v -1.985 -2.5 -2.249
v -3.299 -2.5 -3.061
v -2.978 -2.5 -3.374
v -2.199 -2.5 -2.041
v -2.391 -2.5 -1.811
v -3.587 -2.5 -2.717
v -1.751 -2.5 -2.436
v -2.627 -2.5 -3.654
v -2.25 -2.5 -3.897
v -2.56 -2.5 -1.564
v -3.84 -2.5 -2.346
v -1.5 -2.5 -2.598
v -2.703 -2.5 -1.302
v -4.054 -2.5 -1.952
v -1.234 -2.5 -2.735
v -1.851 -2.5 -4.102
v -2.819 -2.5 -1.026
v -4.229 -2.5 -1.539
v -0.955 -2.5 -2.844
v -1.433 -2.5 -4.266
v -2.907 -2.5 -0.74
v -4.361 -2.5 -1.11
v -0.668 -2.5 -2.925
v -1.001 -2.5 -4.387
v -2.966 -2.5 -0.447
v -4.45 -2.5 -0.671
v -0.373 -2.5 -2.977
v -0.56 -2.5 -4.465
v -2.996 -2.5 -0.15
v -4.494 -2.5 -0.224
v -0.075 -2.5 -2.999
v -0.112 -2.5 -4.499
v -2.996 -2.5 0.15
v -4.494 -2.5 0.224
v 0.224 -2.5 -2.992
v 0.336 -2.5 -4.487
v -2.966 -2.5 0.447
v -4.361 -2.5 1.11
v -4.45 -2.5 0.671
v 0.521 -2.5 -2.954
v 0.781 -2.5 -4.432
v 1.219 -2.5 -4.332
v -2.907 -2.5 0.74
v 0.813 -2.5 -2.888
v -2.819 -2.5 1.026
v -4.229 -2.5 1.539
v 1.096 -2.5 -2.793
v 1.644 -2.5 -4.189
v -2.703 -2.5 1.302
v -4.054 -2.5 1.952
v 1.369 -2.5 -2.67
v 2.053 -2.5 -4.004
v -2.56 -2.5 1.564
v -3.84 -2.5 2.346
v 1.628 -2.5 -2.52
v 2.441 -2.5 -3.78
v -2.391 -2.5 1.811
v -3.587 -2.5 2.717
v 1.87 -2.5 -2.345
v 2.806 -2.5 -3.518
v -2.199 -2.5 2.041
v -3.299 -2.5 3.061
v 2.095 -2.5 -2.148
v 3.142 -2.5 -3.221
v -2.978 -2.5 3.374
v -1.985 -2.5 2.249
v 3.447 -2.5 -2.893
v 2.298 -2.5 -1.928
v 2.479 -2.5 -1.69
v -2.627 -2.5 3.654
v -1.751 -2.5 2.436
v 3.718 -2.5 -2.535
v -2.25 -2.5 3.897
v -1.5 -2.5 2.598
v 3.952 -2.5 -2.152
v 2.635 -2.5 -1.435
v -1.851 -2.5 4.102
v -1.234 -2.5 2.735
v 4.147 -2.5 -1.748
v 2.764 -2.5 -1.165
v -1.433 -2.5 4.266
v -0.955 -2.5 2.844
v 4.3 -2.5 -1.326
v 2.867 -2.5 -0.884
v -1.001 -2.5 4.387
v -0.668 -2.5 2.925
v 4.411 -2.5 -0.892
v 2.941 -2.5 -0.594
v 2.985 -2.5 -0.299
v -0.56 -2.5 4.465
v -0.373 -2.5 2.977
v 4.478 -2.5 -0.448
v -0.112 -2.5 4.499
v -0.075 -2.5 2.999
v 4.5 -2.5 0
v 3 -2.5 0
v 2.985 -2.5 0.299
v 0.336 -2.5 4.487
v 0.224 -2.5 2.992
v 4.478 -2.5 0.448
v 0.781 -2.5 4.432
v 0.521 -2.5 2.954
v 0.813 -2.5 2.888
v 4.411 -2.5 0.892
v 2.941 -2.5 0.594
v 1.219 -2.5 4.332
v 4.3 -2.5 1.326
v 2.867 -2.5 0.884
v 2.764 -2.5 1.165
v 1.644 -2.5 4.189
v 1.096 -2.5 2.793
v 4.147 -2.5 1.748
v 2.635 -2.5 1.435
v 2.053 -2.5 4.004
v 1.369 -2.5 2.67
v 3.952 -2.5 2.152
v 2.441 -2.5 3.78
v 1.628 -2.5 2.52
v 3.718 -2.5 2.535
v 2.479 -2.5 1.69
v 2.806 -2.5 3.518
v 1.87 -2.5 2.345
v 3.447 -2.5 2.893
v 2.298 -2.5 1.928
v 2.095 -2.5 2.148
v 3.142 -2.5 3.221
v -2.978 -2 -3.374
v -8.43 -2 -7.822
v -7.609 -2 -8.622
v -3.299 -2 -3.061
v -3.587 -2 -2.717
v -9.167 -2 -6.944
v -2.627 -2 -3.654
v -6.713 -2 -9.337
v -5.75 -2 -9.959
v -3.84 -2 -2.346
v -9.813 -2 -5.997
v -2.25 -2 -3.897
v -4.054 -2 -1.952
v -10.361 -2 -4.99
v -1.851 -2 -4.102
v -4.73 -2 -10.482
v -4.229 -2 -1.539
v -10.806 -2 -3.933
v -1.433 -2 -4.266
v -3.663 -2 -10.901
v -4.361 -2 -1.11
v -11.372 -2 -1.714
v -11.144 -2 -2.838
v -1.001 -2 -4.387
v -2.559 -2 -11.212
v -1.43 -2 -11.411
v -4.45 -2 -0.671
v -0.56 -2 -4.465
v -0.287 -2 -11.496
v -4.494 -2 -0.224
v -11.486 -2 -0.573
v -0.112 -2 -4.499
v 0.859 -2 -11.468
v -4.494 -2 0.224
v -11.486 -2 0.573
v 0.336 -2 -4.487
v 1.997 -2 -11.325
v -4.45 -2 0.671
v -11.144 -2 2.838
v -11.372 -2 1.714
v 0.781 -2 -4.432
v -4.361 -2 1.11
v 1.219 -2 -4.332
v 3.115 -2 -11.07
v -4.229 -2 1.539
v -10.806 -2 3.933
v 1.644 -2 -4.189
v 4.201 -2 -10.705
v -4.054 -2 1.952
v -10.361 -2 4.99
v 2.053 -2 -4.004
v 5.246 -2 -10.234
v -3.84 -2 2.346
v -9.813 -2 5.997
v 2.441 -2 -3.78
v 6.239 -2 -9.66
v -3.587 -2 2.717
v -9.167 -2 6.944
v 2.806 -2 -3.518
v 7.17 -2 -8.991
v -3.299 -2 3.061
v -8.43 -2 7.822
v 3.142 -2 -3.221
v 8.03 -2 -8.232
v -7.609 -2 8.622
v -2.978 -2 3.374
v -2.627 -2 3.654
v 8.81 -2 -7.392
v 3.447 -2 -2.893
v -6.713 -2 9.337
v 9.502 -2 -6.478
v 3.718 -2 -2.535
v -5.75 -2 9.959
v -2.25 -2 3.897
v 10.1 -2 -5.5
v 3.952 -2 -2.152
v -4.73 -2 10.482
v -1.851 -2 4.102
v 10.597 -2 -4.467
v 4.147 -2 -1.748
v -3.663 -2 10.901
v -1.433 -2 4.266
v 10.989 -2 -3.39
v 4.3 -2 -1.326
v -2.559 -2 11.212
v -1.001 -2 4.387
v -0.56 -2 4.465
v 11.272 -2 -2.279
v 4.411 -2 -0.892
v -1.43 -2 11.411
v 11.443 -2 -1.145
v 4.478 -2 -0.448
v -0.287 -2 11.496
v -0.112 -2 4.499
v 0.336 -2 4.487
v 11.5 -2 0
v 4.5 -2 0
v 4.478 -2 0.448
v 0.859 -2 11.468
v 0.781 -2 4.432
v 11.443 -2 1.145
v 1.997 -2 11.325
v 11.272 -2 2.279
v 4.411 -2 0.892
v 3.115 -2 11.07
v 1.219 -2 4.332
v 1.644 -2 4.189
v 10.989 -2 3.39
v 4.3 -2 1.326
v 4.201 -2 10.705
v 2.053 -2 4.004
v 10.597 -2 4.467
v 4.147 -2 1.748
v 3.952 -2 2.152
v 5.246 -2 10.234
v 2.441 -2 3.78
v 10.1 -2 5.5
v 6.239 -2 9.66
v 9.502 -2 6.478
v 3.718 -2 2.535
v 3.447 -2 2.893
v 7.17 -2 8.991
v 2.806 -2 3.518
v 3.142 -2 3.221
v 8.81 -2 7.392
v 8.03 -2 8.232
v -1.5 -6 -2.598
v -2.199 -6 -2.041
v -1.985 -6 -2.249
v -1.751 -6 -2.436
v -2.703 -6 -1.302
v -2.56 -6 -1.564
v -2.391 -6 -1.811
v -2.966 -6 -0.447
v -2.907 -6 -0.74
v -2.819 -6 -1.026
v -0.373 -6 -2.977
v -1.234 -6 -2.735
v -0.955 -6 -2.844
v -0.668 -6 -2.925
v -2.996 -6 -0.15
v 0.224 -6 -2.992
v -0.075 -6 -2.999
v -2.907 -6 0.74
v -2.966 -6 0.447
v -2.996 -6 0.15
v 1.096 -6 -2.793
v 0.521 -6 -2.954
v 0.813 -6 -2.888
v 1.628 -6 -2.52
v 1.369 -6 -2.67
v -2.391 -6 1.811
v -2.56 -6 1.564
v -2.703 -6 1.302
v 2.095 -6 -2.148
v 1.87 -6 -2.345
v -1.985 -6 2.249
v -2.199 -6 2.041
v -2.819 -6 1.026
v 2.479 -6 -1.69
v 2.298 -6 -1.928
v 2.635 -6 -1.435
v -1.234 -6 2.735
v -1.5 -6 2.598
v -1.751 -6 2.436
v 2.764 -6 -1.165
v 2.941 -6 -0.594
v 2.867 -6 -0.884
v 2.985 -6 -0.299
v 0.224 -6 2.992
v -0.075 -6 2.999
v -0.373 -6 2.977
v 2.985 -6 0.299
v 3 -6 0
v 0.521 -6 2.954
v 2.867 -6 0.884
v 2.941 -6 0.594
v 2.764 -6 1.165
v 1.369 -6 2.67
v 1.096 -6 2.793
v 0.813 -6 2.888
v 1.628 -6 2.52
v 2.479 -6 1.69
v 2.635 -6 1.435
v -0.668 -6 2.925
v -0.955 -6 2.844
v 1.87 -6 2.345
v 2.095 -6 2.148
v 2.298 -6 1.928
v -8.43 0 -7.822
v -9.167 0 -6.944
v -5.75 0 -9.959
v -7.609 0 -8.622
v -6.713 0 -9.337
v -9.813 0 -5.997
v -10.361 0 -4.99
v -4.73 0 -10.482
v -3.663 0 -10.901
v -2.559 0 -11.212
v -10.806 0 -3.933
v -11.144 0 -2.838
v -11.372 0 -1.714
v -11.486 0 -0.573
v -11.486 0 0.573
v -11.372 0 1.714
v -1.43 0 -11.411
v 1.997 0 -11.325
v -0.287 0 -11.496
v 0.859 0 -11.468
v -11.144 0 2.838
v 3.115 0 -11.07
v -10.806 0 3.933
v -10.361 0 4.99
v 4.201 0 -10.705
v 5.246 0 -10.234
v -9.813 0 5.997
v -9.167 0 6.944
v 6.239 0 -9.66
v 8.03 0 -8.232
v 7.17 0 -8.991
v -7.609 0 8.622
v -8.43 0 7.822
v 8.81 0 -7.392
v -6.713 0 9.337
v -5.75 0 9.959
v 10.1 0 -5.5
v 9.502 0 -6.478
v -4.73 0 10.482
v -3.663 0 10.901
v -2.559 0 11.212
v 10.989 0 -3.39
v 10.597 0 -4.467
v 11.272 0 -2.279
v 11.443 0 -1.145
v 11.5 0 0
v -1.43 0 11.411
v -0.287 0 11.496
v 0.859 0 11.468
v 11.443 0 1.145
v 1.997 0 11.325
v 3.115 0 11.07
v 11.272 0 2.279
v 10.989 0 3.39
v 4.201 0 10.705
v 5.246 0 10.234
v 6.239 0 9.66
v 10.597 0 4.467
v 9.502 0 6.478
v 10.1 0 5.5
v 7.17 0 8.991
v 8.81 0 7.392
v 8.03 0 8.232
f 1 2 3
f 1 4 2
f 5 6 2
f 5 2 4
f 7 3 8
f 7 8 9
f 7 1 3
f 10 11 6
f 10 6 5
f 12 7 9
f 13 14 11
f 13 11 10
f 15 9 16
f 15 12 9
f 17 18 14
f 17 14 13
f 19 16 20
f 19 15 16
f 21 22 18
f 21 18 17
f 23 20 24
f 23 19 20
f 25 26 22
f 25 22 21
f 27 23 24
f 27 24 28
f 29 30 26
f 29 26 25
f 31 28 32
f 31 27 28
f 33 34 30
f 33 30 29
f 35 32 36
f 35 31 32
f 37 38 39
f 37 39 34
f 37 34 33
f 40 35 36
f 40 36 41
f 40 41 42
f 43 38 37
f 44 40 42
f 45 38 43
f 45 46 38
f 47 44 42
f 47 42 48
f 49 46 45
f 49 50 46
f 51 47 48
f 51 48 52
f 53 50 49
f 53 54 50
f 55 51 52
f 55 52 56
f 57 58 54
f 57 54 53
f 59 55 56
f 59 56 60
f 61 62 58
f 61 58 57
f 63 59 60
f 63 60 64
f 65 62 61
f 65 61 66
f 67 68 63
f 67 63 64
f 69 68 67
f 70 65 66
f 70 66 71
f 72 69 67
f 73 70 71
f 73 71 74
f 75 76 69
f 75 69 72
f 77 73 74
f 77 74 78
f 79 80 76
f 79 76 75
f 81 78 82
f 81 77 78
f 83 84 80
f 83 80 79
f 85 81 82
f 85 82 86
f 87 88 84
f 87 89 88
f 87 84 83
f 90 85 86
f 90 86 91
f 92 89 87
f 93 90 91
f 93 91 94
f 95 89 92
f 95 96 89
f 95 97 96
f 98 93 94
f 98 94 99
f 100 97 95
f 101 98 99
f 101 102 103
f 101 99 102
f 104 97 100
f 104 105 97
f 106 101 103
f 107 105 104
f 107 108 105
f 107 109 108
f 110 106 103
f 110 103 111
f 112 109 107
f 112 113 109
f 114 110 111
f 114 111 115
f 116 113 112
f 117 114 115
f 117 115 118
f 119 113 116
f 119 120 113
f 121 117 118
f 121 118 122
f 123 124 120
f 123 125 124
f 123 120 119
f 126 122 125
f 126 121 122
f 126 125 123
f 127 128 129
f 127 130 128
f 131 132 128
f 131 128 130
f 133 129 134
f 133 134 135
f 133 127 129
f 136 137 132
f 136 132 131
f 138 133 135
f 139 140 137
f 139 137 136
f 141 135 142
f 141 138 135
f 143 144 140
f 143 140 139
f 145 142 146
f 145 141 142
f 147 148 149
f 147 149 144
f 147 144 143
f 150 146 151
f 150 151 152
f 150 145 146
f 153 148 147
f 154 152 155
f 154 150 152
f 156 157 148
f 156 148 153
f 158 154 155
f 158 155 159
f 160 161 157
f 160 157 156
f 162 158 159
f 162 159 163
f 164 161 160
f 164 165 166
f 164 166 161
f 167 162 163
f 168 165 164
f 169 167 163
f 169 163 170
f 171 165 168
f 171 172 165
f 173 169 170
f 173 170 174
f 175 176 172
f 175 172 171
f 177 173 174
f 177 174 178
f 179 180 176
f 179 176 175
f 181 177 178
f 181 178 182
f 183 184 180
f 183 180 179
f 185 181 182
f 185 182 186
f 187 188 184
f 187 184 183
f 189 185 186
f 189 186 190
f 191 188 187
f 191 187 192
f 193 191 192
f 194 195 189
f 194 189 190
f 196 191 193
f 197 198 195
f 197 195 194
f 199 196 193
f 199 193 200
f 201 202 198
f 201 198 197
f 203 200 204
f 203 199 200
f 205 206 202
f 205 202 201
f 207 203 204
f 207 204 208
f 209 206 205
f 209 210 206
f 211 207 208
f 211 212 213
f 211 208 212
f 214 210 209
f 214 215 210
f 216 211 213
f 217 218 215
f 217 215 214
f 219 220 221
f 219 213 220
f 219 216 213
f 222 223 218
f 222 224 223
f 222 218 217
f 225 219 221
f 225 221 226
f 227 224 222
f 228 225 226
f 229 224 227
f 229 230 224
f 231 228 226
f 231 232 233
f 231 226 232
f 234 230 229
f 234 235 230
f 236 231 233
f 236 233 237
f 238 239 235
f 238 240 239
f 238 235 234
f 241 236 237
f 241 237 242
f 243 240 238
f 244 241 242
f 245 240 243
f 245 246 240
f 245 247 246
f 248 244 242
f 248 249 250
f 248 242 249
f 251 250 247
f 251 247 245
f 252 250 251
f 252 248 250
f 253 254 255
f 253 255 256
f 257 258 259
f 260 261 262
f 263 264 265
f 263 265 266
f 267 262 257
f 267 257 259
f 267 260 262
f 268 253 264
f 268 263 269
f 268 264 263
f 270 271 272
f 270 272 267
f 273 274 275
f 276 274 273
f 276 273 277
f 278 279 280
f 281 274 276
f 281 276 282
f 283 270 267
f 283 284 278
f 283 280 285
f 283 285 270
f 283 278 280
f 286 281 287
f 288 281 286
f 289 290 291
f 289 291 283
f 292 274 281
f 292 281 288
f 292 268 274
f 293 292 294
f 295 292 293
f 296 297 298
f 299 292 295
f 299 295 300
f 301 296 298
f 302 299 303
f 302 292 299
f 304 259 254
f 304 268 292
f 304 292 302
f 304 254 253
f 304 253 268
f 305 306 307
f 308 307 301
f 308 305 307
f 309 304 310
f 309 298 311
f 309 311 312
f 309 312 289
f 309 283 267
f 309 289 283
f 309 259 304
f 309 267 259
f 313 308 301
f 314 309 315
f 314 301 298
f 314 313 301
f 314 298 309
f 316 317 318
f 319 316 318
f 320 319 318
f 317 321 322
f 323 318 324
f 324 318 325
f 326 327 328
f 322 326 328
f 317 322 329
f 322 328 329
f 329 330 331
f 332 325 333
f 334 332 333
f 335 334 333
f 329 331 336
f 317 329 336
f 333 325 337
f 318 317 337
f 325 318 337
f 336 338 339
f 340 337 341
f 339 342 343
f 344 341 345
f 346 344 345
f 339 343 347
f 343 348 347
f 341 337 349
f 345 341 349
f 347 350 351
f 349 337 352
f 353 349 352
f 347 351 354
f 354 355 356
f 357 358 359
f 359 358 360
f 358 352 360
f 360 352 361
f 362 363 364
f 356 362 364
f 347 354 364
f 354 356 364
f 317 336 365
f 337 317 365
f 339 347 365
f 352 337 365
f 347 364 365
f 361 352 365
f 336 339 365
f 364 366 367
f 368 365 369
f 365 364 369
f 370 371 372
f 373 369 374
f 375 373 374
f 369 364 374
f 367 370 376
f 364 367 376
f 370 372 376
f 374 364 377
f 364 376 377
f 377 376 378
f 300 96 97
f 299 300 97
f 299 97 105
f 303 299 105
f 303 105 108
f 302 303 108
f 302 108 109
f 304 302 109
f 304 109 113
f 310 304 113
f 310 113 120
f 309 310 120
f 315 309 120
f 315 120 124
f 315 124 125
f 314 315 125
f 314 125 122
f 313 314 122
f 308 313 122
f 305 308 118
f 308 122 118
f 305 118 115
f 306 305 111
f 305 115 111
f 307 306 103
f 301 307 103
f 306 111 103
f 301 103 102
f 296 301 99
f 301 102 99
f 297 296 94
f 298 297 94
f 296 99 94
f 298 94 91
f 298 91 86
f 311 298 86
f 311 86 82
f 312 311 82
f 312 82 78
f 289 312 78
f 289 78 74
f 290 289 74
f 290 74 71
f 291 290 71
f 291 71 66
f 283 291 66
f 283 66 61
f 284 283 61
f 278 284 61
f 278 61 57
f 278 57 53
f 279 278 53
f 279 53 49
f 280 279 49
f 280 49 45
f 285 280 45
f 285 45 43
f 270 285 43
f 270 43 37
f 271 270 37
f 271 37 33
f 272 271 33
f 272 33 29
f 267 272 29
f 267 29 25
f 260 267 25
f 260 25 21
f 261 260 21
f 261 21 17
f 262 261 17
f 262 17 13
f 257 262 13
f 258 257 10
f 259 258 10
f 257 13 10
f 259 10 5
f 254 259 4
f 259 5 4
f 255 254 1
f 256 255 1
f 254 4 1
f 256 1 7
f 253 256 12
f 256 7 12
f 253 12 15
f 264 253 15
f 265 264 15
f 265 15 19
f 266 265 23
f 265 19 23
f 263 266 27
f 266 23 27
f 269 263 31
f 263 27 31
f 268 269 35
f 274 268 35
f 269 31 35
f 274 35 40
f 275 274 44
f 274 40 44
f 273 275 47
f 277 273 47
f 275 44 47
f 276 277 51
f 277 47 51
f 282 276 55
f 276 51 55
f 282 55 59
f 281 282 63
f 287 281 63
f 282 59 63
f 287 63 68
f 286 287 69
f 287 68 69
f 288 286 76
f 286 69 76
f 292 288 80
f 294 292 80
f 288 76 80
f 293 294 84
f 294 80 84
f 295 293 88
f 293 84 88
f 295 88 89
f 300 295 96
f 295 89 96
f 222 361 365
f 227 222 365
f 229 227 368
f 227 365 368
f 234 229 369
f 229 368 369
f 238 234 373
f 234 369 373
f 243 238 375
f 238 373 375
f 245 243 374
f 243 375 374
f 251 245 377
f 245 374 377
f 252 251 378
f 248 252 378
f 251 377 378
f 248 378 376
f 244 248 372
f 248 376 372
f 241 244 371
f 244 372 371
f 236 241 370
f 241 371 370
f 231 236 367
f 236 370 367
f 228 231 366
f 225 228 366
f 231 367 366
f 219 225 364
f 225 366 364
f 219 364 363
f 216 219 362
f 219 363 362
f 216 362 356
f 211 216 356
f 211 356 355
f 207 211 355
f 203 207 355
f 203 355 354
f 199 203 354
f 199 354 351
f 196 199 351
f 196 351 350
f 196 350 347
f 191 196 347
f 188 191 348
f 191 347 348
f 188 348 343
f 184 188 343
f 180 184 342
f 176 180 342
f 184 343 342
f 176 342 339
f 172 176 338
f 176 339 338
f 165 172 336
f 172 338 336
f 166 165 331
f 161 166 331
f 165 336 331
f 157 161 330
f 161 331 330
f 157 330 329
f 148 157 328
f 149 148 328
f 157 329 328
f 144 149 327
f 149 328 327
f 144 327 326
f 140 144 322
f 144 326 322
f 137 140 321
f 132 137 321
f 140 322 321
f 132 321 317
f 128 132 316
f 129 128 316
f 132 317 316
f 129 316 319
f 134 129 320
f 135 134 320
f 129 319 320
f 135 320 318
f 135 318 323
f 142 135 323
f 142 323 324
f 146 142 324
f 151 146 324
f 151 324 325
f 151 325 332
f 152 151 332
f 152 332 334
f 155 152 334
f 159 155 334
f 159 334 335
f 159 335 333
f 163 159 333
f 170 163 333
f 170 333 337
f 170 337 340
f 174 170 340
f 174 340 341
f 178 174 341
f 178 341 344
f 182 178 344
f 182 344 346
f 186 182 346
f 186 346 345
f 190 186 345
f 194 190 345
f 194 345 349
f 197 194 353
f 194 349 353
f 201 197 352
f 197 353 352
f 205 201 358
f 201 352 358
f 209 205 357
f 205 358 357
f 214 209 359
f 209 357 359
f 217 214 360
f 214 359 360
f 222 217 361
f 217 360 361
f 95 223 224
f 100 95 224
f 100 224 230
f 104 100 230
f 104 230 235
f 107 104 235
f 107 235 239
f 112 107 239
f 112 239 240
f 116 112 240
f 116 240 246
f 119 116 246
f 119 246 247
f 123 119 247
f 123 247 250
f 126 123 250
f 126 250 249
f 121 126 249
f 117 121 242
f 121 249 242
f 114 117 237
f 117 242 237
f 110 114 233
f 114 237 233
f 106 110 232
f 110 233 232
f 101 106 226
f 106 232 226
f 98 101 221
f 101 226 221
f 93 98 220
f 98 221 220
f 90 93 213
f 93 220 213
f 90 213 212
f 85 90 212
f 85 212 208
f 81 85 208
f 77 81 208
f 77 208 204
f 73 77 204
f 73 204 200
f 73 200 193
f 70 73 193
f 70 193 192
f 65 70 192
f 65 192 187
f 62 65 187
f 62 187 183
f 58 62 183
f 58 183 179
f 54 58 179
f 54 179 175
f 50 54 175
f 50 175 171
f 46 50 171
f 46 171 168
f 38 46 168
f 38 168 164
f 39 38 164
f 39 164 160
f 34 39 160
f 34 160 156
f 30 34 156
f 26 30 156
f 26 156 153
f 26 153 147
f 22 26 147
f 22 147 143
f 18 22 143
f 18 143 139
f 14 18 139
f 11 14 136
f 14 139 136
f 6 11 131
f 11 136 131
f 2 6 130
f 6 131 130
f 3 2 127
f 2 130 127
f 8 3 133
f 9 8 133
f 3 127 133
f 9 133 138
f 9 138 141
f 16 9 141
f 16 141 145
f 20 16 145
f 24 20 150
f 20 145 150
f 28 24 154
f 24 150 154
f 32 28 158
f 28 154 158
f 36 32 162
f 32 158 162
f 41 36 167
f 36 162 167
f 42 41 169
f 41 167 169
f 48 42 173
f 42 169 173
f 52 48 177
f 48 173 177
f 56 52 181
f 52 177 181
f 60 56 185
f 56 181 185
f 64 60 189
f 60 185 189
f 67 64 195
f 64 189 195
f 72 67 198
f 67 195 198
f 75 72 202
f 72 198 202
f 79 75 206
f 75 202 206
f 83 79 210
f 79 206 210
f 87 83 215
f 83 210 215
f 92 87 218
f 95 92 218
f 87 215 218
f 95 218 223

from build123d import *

# Parameters (mm, degrees)
F0_R     = 3
F0_R_2   = 4.5
F0_R_3   = 11.5
F1_DEPTH = 2
F2_DEPTH = 2.5
F3_DEPTH = 6


with BuildPart() as f1:
    # F0 (on Front) → F1 (new body)
    with BuildSketch(Plane.XZ):
        Circle(F0_R)
        Circle(F0_R_2)
        Circle(F0_R, mode=Mode.SUBTRACT)
        Circle(F0_R_3)
        Circle(F0_R_2, mode=Mode.SUBTRACT)
    extrude(amount=F1_DEPTH)

    # F0 (on Front) → F2 (join)
    with BuildSketch(Plane.XZ):
        Circle(F0_R_2)
        Circle(F0_R, mode=Mode.SUBTRACT)
    extrude(amount=F2_DEPTH)

    # F0 (on Front) → F3 (join)
    with BuildSketch(Plane.XZ):
        Circle(F0_R)
    extrude(amount=F3_DEPTH)


solid = f1.part
